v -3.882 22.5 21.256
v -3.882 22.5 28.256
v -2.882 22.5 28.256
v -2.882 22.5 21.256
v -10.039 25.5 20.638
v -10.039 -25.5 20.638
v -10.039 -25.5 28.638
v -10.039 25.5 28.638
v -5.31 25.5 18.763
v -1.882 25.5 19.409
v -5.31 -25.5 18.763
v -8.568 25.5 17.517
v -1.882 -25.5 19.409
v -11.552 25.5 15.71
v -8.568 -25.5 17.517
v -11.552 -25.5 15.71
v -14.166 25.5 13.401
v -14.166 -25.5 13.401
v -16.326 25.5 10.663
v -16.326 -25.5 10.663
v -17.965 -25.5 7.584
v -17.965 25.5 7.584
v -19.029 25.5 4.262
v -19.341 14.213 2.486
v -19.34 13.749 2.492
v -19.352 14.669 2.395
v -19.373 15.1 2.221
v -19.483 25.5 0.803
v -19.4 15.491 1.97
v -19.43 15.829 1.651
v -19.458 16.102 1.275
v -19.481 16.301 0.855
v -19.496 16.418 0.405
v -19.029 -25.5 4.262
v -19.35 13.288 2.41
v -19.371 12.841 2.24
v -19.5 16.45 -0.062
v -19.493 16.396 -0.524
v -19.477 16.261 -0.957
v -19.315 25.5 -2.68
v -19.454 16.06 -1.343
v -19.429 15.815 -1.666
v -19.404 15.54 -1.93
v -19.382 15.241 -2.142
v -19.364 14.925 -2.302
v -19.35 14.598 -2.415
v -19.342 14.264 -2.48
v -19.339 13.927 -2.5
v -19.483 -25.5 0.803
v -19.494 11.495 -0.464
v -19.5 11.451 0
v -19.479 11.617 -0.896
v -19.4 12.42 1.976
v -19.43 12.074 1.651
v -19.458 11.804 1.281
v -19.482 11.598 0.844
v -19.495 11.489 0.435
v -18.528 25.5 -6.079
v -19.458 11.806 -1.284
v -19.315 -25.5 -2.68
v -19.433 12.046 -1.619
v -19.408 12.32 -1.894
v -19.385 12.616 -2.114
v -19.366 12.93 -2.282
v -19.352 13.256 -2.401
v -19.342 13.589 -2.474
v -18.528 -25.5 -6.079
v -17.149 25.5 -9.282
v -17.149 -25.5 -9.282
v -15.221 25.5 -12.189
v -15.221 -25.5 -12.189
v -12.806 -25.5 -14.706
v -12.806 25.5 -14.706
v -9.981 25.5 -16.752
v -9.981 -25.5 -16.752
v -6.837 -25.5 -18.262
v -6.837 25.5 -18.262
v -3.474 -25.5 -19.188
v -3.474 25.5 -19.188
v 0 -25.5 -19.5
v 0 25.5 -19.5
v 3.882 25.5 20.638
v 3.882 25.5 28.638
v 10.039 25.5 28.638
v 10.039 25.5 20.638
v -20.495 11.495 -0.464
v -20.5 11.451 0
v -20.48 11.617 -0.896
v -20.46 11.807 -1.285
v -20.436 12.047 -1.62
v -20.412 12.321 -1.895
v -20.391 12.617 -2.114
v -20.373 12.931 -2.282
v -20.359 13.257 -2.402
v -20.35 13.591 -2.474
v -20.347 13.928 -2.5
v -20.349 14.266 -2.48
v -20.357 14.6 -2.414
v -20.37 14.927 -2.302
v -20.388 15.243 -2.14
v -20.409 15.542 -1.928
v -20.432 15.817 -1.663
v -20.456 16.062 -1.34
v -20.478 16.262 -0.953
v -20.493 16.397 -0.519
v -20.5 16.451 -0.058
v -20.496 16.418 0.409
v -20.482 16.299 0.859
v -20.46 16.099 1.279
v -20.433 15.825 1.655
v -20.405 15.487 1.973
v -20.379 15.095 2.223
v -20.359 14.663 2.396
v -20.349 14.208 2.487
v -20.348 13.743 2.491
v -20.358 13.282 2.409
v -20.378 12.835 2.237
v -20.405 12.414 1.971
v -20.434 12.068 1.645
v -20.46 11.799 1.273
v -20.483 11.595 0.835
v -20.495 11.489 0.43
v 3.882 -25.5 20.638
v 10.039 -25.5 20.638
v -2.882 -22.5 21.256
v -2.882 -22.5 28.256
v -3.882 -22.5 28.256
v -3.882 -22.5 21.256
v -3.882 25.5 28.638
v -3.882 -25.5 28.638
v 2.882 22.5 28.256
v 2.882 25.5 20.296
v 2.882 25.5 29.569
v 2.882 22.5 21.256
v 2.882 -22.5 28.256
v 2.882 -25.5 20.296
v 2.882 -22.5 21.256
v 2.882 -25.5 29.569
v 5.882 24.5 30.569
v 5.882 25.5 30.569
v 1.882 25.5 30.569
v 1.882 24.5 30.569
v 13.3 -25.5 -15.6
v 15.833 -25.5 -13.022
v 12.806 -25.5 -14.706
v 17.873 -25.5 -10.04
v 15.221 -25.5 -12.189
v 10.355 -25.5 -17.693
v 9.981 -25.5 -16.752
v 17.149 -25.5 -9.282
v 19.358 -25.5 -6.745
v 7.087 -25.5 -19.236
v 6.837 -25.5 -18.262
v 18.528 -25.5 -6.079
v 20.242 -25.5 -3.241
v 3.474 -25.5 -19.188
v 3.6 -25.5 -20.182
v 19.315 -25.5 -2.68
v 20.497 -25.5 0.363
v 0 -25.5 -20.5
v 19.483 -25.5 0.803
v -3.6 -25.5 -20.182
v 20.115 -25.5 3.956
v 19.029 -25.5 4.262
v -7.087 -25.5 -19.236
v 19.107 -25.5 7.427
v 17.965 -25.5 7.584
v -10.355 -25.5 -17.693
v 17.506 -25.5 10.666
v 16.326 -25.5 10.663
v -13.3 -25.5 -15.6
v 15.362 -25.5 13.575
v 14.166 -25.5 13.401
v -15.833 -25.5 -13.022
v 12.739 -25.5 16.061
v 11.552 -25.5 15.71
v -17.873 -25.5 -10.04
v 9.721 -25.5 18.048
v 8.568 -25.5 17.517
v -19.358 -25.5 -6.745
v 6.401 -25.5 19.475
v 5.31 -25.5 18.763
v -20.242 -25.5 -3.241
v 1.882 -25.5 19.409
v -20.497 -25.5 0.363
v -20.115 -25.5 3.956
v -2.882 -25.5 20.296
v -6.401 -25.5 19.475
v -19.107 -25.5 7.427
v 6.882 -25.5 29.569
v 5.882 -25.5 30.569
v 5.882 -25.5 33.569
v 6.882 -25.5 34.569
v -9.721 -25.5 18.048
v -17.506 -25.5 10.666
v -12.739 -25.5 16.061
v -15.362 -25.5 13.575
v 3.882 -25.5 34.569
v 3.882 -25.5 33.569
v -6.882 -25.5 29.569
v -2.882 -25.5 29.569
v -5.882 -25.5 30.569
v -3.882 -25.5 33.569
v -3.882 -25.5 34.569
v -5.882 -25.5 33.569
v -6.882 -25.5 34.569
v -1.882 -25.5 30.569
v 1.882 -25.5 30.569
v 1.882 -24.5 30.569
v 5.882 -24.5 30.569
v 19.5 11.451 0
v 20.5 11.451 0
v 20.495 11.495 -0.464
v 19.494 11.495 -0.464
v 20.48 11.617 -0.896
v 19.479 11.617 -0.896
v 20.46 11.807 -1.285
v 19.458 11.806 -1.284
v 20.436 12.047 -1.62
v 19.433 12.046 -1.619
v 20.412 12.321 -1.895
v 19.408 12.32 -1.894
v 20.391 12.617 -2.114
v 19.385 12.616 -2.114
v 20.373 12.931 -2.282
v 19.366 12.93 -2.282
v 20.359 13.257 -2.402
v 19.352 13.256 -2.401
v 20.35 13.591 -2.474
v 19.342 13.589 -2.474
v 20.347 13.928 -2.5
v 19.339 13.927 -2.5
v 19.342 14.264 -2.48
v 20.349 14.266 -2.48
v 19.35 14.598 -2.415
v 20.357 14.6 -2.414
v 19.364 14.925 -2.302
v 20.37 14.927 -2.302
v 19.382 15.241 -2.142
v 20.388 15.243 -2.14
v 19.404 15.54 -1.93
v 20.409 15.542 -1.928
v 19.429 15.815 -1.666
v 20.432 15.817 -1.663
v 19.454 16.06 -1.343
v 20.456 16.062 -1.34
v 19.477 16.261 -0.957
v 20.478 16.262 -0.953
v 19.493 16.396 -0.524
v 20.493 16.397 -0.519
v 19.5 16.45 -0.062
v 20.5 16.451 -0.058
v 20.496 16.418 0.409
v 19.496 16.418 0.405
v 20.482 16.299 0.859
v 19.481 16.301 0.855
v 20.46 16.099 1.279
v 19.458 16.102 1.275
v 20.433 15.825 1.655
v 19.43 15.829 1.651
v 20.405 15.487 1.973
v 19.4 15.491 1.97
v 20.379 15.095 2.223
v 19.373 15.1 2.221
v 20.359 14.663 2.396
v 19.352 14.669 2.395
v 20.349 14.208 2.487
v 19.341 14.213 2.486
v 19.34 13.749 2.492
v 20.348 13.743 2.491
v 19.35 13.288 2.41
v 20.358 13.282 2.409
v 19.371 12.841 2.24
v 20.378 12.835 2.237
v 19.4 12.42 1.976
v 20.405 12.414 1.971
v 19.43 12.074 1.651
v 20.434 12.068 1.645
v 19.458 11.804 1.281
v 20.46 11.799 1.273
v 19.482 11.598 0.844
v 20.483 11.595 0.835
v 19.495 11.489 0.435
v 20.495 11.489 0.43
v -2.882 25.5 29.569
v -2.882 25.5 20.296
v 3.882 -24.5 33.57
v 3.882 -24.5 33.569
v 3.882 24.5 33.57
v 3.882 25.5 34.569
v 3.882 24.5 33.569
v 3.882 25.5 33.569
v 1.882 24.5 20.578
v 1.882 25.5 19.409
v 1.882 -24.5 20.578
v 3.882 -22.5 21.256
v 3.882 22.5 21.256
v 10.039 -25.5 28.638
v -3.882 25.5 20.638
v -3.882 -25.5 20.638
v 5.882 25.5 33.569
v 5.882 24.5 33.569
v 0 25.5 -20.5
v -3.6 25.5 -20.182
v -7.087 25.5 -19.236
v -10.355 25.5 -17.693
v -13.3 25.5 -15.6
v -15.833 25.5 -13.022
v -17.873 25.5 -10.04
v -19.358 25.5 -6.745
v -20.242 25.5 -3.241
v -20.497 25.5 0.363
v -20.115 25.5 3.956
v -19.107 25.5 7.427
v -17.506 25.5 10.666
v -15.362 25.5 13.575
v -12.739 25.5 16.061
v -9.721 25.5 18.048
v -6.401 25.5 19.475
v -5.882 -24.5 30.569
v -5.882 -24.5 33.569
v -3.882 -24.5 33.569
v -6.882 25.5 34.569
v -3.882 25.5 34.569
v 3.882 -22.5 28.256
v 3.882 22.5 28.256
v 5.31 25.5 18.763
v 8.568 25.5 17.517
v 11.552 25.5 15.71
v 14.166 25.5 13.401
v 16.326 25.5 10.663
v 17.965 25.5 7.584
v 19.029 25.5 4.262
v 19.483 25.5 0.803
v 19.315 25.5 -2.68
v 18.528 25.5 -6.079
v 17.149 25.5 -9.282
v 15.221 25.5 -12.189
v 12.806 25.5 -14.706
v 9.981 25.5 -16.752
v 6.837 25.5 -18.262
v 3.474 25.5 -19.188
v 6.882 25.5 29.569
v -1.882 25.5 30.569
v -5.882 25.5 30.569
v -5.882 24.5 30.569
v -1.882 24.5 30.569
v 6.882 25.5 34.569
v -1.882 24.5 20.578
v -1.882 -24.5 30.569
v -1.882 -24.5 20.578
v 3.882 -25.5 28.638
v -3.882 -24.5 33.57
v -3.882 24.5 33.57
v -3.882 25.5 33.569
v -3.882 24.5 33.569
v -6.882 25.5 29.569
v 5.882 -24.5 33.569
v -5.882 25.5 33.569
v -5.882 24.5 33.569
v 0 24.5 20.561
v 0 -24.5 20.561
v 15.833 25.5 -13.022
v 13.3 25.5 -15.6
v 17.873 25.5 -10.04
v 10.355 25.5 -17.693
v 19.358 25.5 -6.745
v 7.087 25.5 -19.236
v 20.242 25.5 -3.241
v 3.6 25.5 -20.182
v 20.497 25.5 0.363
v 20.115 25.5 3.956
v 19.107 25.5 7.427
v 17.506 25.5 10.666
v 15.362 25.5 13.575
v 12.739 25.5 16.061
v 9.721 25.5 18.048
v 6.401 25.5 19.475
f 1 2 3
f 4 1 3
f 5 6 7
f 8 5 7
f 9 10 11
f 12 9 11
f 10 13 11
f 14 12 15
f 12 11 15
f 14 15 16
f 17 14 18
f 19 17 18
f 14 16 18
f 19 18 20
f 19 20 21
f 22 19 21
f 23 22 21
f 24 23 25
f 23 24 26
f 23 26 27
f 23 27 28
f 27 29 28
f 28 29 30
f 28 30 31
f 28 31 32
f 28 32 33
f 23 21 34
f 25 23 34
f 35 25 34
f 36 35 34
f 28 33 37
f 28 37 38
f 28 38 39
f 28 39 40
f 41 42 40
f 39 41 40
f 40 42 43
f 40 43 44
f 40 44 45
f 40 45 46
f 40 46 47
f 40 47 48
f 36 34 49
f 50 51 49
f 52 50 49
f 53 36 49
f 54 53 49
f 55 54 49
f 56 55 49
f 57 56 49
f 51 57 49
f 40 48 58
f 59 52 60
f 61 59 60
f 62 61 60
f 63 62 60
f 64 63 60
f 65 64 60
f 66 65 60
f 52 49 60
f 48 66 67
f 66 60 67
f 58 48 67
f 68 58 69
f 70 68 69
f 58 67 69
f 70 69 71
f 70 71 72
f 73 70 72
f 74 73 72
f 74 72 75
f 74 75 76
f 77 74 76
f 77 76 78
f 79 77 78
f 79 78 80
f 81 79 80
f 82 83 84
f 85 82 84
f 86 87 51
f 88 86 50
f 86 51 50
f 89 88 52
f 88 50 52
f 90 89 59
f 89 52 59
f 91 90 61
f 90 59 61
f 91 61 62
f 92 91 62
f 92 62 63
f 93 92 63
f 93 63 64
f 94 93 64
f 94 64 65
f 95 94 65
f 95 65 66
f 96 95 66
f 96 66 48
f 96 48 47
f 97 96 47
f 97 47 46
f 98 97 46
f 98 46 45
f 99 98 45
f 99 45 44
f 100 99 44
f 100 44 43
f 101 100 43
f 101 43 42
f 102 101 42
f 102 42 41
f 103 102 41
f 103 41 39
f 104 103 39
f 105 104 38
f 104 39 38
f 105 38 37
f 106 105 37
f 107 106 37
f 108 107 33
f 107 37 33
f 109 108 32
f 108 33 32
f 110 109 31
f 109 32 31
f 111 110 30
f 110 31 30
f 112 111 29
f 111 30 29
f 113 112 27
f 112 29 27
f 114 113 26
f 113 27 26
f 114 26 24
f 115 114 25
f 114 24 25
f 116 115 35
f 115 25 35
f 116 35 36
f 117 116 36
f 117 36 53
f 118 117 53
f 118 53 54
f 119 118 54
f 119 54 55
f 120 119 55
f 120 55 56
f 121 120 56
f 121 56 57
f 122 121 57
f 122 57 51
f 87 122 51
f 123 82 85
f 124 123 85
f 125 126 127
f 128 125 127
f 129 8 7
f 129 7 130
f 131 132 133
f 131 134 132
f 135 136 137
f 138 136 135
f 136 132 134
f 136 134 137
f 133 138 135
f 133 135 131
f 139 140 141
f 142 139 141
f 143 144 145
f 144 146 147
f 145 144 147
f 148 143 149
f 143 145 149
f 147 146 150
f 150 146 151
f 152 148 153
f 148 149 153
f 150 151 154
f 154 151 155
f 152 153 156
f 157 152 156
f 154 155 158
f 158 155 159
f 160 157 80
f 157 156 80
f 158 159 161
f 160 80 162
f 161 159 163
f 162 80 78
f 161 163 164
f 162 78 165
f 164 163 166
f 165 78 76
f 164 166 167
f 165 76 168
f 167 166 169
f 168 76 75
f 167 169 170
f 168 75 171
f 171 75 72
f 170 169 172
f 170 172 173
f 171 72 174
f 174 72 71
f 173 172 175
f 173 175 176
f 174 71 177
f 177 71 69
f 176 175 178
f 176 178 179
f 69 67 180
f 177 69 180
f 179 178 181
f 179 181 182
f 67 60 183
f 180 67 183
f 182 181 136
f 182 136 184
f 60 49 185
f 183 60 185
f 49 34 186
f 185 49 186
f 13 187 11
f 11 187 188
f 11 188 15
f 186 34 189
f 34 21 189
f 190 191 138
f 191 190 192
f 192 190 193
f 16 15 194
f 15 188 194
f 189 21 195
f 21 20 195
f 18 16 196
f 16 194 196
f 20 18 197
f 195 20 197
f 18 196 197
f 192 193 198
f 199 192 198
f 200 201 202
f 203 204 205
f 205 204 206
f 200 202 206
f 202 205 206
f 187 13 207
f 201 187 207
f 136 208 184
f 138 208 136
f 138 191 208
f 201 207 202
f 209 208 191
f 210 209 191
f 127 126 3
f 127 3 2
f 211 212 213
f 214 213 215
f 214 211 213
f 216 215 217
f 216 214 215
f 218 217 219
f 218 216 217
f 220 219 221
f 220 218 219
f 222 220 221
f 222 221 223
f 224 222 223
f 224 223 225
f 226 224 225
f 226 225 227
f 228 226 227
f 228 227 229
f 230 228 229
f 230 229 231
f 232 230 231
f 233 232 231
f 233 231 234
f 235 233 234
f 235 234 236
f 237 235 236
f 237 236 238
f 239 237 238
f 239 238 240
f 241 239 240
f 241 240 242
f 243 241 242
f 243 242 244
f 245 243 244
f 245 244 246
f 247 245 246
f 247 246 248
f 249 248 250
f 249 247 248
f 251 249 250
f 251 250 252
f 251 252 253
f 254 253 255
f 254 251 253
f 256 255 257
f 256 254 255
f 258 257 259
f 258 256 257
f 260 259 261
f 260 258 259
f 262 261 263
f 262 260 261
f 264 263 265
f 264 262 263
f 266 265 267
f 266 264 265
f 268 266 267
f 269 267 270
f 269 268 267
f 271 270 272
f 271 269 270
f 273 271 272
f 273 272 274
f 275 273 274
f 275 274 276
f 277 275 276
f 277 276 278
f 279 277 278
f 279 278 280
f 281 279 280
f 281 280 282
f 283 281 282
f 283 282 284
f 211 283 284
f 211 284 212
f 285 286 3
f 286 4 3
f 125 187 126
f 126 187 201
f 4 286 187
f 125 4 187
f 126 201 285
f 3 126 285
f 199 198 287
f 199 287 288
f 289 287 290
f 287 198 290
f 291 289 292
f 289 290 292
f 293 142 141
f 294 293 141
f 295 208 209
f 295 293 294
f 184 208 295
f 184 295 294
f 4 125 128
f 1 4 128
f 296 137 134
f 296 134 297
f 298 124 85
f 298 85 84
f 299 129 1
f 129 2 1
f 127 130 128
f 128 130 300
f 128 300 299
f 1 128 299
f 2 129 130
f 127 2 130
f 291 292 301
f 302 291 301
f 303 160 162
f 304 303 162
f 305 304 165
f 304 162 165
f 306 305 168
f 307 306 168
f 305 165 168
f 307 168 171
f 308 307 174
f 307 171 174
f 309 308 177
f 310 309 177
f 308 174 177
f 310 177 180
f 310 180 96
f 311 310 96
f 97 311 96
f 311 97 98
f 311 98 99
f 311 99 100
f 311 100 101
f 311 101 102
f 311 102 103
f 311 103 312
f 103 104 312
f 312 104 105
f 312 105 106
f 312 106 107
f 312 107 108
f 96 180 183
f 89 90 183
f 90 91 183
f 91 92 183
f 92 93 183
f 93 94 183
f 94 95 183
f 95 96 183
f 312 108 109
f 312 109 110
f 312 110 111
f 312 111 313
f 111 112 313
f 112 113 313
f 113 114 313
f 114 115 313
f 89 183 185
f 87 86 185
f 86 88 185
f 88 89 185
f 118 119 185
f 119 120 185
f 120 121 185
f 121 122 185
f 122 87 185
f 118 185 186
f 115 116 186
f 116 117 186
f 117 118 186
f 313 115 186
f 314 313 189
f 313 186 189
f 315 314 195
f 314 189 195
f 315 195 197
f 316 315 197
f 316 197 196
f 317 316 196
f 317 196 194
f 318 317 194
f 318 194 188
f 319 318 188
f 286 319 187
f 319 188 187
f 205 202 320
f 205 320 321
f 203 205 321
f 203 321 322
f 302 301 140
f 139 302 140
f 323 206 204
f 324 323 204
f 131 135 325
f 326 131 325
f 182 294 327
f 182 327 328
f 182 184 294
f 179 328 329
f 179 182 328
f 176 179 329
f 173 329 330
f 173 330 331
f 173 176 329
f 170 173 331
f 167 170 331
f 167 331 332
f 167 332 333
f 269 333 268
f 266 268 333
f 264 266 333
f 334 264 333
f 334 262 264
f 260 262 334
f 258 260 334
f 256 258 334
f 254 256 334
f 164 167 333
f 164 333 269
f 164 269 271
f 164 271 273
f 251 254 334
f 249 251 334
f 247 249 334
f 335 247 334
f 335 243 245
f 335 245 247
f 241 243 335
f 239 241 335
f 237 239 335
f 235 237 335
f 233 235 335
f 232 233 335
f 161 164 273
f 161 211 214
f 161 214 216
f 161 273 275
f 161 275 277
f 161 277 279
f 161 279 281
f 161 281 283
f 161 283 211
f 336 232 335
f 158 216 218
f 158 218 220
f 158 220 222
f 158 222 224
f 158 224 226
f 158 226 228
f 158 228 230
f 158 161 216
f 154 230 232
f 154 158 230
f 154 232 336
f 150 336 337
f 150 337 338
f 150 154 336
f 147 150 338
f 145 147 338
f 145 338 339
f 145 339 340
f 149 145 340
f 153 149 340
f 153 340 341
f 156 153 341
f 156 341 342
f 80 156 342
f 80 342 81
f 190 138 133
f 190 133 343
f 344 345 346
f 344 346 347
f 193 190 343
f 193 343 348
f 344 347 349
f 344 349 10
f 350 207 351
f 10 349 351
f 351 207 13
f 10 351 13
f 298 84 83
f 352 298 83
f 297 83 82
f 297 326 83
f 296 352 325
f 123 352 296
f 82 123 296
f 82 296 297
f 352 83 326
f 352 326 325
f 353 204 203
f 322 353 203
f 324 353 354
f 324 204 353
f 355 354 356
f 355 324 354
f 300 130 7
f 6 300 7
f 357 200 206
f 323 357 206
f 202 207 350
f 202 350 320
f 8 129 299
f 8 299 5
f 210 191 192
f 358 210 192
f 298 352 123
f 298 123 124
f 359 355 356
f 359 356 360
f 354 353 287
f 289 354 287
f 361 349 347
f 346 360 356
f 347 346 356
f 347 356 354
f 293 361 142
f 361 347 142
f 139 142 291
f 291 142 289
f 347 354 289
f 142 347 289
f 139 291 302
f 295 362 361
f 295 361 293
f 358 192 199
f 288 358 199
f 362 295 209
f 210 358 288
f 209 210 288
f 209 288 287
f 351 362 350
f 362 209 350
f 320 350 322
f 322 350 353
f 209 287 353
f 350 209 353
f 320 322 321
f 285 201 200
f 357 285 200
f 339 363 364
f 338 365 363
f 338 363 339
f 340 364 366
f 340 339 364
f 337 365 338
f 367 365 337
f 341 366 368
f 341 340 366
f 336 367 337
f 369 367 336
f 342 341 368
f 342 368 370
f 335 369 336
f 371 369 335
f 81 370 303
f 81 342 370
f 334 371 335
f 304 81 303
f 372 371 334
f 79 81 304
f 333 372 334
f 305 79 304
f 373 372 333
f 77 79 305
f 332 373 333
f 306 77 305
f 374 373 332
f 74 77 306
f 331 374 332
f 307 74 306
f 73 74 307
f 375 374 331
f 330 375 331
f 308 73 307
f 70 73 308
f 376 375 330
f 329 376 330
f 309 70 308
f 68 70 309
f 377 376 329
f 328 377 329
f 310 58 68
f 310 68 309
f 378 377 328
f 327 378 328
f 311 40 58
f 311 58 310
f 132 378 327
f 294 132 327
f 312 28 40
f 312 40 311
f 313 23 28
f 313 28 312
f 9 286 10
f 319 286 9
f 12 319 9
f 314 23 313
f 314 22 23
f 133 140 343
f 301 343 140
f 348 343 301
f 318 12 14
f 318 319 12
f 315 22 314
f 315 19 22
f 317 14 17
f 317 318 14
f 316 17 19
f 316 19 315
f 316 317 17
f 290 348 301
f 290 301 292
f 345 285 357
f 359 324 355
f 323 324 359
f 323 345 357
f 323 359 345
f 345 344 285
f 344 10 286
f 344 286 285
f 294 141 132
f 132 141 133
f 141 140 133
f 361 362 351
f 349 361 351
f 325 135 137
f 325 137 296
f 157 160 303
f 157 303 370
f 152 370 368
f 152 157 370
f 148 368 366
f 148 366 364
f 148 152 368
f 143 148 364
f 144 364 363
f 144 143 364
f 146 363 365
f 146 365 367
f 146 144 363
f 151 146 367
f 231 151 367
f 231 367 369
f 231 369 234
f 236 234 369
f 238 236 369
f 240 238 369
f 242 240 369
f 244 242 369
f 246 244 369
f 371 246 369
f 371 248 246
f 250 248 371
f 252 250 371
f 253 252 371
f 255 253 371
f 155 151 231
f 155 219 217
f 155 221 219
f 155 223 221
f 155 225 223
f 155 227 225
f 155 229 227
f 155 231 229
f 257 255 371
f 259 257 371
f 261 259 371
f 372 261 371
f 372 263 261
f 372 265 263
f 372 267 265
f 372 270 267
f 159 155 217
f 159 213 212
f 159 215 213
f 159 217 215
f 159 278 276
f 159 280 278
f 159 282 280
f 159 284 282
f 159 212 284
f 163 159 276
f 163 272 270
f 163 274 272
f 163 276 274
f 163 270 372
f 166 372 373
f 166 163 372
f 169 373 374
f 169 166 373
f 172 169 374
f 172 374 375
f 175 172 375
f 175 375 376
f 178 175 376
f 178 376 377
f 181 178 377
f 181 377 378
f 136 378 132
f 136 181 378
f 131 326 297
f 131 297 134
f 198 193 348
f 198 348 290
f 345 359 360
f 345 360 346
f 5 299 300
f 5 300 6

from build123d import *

# Parameters (mm, degrees)
F0_W      = 1
F0_H      = 7
F1_DEPTH  = 25.5
F2_W      = 1
F2_H      = 7
F3_DEPTH  = 3
F4_W      = 1
F4_H      = 7
F5_DEPTH  = 3
F7_DEPTH  = 1
F9_DEPTH  = 1
F13_D     = 5
F13_DEPTH = 6
F13_TIP   = 1.5021515476


# Not quite as in the source:
# - a pattern or mirror of a feature is missing from the dataset's text; its kind, count and spacing are read off the source's solid


with BuildPart() as f1:
    # F0 (on Front) → F1 (new body, symmetric)
    with BuildSketch(Plane.XZ):
        with BuildLine():
            ThreePointArc((1.8823727184, 19.4089328132), (19.4772198973, -0.9422871488), (0, -19.5))
            Line((0, -19.5), (0, -20.5))
            ThreePointArc((0, -20.5), (20.4490247642, -1.444778942), (2.8823727184, 20.2963525667))
            Line((2.8823727184, 20.2963525667), (2.8823727184, 21.2562642992))
            Line((2.8823727184, 21.2562642992), (2.8823727184, 28.2562642992))
            Line((2.8823727184, 28.2562642992), (2.8823727184, 29.5688871337))
            Line((2.8823727184, 29.5688871337), (6.8823727184, 29.5688871337))
            Line((6.8823727184, 29.5688871337), (6.8823727184, 34.5688871337))
            Line((6.8823727184, 34.5688871337), (3.8823727184, 34.5688871337))
            Line((3.8823727184, 34.5688871337), (3.8823727184, 33.5702374578))
            Line((3.8823727184, 33.5702374578), (3.8823727184, 33.5688871337))
            Line((3.8823727184, 33.5688871337), (5.8823727184, 33.5688871337))
            Line((5.8823727184, 33.5688871337), (5.8823727184, 30.5688871337))
            Line((5.8823727184, 30.5688871337), (1.8823727184, 30.5688871337))
            Line((1.8823727184, 30.5688871337), (1.8823727184, 20.578497021))
            Line((1.8823727184, 20.578497021), (1.8823727184, 19.4089328132))
        make_face()
        Polygon((0, 20.561426878), (1.8823727184, 20.578497021), (1.8823727184, 30.5688871337), (5.8823727184, 30.5688871337), (5.8823727184, 33.5688871337), (3.8823727184, 33.5688871337), (3.8823727184, 33.5702374578), (0, 33.5702374578), align=None)
        with Locations((3.3823727184, 24.7562642992)):
            Rectangle(F0_W, F0_H)
        Polygon((3.8823727184, 28.2562642992), (3.8823727184, 21.2562642992), (3.8823727184, 20.6377897412), (10.0385518745, 20.6377897412), (10.0385518745, 28.6377897412), (3.8823727184, 28.6377897412), align=None)
    extrude(amount=F1_DEPTH, both=True)

    # F2 (on face) → F3 (cut)
    with BuildSketch(Plane.XZ.offset(25.5)):
        with Locations((3.3823727184, 24.7562642992)):
            Rectangle(F2_W, F2_H)
    extrude(amount=-F3_DEPTH, mode=Mode.SUBTRACT)

    # F4 (on face) → F5 (cut)
    with BuildSketch(Plane(origin=(0, 25.5, 0), x_dir=(-1, 0, 0), z_dir=(0, 1, 0))):
        with Locations((-3.3823727184, 24.7562642992)):
            Rectangle(F4_W, F4_H)
    extrude(amount=-F5_DEPTH, mode=Mode.SUBTRACT)

    # F6 (on face) → F7 (cut)
    with BuildSketch(Plane.XZ.offset(25.5)):
        Polygon((0, 20.561426878), (1.8823727184, 20.578497021), (1.8823727184, 30.5688871337), (5.8823727184, 30.5688871337), (5.8823727184, 33.5688871337), (3.8823727184, 33.5688871337), (3.8823727184, 33.5702374578), (0, 33.5702374578), align=None)
    extrude(amount=-F7_DEPTH, mode=Mode.SUBTRACT)

    # F8 (on face) → F9 (cut)
    with BuildSketch(Plane(origin=(0, 25.5, 0), x_dir=(-1, 0, 0), z_dir=(0, 1, 0))):
        Polygon((-1.8823727184, 30.5688871337), (-1.8823727184, 20.578497021), (0, 20.561426878), (0, 33.5702374578), (-3.8823727184, 33.5702374578), (-3.8823727184, 33.5688871337), (-5.8823727184, 33.5688871337), (-5.8823727184, 30.5688871337), align=None)
    extrude(amount=-F9_DEPTH, mode=Mode.SUBTRACT)

    # F10: F1 across plane


with BuildPart() as f1_1:
    add(f1.part)
    add(f1.part.mirror(Plane.YZ))

    # F13
    with Locations(Plane(origin=(-20.5, 0, 0), x_dir=(0, 1, 0), z_dir=(-1, 0, 0))):
        with Locations((13.9512377791, 0)):
            f13 = Hole(F13_D / 2, depth=F13_DEPTH)
            with Locations((0, 0, -(F13_DEPTH + F13_TIP / 2))):  # 118° drill point
                Cone(0, F13_D / 2, F13_TIP, mode=Mode.SUBTRACT)

    # F13_copies: F13 across plane
    add(f13.mirror(Plane(origin=(-1.9e-05, 0, 0), x_dir=(0, 0, 1), z_dir=(1, 0, 0))), mode=Mode.SUBTRACT)


solid = f1_1.part
